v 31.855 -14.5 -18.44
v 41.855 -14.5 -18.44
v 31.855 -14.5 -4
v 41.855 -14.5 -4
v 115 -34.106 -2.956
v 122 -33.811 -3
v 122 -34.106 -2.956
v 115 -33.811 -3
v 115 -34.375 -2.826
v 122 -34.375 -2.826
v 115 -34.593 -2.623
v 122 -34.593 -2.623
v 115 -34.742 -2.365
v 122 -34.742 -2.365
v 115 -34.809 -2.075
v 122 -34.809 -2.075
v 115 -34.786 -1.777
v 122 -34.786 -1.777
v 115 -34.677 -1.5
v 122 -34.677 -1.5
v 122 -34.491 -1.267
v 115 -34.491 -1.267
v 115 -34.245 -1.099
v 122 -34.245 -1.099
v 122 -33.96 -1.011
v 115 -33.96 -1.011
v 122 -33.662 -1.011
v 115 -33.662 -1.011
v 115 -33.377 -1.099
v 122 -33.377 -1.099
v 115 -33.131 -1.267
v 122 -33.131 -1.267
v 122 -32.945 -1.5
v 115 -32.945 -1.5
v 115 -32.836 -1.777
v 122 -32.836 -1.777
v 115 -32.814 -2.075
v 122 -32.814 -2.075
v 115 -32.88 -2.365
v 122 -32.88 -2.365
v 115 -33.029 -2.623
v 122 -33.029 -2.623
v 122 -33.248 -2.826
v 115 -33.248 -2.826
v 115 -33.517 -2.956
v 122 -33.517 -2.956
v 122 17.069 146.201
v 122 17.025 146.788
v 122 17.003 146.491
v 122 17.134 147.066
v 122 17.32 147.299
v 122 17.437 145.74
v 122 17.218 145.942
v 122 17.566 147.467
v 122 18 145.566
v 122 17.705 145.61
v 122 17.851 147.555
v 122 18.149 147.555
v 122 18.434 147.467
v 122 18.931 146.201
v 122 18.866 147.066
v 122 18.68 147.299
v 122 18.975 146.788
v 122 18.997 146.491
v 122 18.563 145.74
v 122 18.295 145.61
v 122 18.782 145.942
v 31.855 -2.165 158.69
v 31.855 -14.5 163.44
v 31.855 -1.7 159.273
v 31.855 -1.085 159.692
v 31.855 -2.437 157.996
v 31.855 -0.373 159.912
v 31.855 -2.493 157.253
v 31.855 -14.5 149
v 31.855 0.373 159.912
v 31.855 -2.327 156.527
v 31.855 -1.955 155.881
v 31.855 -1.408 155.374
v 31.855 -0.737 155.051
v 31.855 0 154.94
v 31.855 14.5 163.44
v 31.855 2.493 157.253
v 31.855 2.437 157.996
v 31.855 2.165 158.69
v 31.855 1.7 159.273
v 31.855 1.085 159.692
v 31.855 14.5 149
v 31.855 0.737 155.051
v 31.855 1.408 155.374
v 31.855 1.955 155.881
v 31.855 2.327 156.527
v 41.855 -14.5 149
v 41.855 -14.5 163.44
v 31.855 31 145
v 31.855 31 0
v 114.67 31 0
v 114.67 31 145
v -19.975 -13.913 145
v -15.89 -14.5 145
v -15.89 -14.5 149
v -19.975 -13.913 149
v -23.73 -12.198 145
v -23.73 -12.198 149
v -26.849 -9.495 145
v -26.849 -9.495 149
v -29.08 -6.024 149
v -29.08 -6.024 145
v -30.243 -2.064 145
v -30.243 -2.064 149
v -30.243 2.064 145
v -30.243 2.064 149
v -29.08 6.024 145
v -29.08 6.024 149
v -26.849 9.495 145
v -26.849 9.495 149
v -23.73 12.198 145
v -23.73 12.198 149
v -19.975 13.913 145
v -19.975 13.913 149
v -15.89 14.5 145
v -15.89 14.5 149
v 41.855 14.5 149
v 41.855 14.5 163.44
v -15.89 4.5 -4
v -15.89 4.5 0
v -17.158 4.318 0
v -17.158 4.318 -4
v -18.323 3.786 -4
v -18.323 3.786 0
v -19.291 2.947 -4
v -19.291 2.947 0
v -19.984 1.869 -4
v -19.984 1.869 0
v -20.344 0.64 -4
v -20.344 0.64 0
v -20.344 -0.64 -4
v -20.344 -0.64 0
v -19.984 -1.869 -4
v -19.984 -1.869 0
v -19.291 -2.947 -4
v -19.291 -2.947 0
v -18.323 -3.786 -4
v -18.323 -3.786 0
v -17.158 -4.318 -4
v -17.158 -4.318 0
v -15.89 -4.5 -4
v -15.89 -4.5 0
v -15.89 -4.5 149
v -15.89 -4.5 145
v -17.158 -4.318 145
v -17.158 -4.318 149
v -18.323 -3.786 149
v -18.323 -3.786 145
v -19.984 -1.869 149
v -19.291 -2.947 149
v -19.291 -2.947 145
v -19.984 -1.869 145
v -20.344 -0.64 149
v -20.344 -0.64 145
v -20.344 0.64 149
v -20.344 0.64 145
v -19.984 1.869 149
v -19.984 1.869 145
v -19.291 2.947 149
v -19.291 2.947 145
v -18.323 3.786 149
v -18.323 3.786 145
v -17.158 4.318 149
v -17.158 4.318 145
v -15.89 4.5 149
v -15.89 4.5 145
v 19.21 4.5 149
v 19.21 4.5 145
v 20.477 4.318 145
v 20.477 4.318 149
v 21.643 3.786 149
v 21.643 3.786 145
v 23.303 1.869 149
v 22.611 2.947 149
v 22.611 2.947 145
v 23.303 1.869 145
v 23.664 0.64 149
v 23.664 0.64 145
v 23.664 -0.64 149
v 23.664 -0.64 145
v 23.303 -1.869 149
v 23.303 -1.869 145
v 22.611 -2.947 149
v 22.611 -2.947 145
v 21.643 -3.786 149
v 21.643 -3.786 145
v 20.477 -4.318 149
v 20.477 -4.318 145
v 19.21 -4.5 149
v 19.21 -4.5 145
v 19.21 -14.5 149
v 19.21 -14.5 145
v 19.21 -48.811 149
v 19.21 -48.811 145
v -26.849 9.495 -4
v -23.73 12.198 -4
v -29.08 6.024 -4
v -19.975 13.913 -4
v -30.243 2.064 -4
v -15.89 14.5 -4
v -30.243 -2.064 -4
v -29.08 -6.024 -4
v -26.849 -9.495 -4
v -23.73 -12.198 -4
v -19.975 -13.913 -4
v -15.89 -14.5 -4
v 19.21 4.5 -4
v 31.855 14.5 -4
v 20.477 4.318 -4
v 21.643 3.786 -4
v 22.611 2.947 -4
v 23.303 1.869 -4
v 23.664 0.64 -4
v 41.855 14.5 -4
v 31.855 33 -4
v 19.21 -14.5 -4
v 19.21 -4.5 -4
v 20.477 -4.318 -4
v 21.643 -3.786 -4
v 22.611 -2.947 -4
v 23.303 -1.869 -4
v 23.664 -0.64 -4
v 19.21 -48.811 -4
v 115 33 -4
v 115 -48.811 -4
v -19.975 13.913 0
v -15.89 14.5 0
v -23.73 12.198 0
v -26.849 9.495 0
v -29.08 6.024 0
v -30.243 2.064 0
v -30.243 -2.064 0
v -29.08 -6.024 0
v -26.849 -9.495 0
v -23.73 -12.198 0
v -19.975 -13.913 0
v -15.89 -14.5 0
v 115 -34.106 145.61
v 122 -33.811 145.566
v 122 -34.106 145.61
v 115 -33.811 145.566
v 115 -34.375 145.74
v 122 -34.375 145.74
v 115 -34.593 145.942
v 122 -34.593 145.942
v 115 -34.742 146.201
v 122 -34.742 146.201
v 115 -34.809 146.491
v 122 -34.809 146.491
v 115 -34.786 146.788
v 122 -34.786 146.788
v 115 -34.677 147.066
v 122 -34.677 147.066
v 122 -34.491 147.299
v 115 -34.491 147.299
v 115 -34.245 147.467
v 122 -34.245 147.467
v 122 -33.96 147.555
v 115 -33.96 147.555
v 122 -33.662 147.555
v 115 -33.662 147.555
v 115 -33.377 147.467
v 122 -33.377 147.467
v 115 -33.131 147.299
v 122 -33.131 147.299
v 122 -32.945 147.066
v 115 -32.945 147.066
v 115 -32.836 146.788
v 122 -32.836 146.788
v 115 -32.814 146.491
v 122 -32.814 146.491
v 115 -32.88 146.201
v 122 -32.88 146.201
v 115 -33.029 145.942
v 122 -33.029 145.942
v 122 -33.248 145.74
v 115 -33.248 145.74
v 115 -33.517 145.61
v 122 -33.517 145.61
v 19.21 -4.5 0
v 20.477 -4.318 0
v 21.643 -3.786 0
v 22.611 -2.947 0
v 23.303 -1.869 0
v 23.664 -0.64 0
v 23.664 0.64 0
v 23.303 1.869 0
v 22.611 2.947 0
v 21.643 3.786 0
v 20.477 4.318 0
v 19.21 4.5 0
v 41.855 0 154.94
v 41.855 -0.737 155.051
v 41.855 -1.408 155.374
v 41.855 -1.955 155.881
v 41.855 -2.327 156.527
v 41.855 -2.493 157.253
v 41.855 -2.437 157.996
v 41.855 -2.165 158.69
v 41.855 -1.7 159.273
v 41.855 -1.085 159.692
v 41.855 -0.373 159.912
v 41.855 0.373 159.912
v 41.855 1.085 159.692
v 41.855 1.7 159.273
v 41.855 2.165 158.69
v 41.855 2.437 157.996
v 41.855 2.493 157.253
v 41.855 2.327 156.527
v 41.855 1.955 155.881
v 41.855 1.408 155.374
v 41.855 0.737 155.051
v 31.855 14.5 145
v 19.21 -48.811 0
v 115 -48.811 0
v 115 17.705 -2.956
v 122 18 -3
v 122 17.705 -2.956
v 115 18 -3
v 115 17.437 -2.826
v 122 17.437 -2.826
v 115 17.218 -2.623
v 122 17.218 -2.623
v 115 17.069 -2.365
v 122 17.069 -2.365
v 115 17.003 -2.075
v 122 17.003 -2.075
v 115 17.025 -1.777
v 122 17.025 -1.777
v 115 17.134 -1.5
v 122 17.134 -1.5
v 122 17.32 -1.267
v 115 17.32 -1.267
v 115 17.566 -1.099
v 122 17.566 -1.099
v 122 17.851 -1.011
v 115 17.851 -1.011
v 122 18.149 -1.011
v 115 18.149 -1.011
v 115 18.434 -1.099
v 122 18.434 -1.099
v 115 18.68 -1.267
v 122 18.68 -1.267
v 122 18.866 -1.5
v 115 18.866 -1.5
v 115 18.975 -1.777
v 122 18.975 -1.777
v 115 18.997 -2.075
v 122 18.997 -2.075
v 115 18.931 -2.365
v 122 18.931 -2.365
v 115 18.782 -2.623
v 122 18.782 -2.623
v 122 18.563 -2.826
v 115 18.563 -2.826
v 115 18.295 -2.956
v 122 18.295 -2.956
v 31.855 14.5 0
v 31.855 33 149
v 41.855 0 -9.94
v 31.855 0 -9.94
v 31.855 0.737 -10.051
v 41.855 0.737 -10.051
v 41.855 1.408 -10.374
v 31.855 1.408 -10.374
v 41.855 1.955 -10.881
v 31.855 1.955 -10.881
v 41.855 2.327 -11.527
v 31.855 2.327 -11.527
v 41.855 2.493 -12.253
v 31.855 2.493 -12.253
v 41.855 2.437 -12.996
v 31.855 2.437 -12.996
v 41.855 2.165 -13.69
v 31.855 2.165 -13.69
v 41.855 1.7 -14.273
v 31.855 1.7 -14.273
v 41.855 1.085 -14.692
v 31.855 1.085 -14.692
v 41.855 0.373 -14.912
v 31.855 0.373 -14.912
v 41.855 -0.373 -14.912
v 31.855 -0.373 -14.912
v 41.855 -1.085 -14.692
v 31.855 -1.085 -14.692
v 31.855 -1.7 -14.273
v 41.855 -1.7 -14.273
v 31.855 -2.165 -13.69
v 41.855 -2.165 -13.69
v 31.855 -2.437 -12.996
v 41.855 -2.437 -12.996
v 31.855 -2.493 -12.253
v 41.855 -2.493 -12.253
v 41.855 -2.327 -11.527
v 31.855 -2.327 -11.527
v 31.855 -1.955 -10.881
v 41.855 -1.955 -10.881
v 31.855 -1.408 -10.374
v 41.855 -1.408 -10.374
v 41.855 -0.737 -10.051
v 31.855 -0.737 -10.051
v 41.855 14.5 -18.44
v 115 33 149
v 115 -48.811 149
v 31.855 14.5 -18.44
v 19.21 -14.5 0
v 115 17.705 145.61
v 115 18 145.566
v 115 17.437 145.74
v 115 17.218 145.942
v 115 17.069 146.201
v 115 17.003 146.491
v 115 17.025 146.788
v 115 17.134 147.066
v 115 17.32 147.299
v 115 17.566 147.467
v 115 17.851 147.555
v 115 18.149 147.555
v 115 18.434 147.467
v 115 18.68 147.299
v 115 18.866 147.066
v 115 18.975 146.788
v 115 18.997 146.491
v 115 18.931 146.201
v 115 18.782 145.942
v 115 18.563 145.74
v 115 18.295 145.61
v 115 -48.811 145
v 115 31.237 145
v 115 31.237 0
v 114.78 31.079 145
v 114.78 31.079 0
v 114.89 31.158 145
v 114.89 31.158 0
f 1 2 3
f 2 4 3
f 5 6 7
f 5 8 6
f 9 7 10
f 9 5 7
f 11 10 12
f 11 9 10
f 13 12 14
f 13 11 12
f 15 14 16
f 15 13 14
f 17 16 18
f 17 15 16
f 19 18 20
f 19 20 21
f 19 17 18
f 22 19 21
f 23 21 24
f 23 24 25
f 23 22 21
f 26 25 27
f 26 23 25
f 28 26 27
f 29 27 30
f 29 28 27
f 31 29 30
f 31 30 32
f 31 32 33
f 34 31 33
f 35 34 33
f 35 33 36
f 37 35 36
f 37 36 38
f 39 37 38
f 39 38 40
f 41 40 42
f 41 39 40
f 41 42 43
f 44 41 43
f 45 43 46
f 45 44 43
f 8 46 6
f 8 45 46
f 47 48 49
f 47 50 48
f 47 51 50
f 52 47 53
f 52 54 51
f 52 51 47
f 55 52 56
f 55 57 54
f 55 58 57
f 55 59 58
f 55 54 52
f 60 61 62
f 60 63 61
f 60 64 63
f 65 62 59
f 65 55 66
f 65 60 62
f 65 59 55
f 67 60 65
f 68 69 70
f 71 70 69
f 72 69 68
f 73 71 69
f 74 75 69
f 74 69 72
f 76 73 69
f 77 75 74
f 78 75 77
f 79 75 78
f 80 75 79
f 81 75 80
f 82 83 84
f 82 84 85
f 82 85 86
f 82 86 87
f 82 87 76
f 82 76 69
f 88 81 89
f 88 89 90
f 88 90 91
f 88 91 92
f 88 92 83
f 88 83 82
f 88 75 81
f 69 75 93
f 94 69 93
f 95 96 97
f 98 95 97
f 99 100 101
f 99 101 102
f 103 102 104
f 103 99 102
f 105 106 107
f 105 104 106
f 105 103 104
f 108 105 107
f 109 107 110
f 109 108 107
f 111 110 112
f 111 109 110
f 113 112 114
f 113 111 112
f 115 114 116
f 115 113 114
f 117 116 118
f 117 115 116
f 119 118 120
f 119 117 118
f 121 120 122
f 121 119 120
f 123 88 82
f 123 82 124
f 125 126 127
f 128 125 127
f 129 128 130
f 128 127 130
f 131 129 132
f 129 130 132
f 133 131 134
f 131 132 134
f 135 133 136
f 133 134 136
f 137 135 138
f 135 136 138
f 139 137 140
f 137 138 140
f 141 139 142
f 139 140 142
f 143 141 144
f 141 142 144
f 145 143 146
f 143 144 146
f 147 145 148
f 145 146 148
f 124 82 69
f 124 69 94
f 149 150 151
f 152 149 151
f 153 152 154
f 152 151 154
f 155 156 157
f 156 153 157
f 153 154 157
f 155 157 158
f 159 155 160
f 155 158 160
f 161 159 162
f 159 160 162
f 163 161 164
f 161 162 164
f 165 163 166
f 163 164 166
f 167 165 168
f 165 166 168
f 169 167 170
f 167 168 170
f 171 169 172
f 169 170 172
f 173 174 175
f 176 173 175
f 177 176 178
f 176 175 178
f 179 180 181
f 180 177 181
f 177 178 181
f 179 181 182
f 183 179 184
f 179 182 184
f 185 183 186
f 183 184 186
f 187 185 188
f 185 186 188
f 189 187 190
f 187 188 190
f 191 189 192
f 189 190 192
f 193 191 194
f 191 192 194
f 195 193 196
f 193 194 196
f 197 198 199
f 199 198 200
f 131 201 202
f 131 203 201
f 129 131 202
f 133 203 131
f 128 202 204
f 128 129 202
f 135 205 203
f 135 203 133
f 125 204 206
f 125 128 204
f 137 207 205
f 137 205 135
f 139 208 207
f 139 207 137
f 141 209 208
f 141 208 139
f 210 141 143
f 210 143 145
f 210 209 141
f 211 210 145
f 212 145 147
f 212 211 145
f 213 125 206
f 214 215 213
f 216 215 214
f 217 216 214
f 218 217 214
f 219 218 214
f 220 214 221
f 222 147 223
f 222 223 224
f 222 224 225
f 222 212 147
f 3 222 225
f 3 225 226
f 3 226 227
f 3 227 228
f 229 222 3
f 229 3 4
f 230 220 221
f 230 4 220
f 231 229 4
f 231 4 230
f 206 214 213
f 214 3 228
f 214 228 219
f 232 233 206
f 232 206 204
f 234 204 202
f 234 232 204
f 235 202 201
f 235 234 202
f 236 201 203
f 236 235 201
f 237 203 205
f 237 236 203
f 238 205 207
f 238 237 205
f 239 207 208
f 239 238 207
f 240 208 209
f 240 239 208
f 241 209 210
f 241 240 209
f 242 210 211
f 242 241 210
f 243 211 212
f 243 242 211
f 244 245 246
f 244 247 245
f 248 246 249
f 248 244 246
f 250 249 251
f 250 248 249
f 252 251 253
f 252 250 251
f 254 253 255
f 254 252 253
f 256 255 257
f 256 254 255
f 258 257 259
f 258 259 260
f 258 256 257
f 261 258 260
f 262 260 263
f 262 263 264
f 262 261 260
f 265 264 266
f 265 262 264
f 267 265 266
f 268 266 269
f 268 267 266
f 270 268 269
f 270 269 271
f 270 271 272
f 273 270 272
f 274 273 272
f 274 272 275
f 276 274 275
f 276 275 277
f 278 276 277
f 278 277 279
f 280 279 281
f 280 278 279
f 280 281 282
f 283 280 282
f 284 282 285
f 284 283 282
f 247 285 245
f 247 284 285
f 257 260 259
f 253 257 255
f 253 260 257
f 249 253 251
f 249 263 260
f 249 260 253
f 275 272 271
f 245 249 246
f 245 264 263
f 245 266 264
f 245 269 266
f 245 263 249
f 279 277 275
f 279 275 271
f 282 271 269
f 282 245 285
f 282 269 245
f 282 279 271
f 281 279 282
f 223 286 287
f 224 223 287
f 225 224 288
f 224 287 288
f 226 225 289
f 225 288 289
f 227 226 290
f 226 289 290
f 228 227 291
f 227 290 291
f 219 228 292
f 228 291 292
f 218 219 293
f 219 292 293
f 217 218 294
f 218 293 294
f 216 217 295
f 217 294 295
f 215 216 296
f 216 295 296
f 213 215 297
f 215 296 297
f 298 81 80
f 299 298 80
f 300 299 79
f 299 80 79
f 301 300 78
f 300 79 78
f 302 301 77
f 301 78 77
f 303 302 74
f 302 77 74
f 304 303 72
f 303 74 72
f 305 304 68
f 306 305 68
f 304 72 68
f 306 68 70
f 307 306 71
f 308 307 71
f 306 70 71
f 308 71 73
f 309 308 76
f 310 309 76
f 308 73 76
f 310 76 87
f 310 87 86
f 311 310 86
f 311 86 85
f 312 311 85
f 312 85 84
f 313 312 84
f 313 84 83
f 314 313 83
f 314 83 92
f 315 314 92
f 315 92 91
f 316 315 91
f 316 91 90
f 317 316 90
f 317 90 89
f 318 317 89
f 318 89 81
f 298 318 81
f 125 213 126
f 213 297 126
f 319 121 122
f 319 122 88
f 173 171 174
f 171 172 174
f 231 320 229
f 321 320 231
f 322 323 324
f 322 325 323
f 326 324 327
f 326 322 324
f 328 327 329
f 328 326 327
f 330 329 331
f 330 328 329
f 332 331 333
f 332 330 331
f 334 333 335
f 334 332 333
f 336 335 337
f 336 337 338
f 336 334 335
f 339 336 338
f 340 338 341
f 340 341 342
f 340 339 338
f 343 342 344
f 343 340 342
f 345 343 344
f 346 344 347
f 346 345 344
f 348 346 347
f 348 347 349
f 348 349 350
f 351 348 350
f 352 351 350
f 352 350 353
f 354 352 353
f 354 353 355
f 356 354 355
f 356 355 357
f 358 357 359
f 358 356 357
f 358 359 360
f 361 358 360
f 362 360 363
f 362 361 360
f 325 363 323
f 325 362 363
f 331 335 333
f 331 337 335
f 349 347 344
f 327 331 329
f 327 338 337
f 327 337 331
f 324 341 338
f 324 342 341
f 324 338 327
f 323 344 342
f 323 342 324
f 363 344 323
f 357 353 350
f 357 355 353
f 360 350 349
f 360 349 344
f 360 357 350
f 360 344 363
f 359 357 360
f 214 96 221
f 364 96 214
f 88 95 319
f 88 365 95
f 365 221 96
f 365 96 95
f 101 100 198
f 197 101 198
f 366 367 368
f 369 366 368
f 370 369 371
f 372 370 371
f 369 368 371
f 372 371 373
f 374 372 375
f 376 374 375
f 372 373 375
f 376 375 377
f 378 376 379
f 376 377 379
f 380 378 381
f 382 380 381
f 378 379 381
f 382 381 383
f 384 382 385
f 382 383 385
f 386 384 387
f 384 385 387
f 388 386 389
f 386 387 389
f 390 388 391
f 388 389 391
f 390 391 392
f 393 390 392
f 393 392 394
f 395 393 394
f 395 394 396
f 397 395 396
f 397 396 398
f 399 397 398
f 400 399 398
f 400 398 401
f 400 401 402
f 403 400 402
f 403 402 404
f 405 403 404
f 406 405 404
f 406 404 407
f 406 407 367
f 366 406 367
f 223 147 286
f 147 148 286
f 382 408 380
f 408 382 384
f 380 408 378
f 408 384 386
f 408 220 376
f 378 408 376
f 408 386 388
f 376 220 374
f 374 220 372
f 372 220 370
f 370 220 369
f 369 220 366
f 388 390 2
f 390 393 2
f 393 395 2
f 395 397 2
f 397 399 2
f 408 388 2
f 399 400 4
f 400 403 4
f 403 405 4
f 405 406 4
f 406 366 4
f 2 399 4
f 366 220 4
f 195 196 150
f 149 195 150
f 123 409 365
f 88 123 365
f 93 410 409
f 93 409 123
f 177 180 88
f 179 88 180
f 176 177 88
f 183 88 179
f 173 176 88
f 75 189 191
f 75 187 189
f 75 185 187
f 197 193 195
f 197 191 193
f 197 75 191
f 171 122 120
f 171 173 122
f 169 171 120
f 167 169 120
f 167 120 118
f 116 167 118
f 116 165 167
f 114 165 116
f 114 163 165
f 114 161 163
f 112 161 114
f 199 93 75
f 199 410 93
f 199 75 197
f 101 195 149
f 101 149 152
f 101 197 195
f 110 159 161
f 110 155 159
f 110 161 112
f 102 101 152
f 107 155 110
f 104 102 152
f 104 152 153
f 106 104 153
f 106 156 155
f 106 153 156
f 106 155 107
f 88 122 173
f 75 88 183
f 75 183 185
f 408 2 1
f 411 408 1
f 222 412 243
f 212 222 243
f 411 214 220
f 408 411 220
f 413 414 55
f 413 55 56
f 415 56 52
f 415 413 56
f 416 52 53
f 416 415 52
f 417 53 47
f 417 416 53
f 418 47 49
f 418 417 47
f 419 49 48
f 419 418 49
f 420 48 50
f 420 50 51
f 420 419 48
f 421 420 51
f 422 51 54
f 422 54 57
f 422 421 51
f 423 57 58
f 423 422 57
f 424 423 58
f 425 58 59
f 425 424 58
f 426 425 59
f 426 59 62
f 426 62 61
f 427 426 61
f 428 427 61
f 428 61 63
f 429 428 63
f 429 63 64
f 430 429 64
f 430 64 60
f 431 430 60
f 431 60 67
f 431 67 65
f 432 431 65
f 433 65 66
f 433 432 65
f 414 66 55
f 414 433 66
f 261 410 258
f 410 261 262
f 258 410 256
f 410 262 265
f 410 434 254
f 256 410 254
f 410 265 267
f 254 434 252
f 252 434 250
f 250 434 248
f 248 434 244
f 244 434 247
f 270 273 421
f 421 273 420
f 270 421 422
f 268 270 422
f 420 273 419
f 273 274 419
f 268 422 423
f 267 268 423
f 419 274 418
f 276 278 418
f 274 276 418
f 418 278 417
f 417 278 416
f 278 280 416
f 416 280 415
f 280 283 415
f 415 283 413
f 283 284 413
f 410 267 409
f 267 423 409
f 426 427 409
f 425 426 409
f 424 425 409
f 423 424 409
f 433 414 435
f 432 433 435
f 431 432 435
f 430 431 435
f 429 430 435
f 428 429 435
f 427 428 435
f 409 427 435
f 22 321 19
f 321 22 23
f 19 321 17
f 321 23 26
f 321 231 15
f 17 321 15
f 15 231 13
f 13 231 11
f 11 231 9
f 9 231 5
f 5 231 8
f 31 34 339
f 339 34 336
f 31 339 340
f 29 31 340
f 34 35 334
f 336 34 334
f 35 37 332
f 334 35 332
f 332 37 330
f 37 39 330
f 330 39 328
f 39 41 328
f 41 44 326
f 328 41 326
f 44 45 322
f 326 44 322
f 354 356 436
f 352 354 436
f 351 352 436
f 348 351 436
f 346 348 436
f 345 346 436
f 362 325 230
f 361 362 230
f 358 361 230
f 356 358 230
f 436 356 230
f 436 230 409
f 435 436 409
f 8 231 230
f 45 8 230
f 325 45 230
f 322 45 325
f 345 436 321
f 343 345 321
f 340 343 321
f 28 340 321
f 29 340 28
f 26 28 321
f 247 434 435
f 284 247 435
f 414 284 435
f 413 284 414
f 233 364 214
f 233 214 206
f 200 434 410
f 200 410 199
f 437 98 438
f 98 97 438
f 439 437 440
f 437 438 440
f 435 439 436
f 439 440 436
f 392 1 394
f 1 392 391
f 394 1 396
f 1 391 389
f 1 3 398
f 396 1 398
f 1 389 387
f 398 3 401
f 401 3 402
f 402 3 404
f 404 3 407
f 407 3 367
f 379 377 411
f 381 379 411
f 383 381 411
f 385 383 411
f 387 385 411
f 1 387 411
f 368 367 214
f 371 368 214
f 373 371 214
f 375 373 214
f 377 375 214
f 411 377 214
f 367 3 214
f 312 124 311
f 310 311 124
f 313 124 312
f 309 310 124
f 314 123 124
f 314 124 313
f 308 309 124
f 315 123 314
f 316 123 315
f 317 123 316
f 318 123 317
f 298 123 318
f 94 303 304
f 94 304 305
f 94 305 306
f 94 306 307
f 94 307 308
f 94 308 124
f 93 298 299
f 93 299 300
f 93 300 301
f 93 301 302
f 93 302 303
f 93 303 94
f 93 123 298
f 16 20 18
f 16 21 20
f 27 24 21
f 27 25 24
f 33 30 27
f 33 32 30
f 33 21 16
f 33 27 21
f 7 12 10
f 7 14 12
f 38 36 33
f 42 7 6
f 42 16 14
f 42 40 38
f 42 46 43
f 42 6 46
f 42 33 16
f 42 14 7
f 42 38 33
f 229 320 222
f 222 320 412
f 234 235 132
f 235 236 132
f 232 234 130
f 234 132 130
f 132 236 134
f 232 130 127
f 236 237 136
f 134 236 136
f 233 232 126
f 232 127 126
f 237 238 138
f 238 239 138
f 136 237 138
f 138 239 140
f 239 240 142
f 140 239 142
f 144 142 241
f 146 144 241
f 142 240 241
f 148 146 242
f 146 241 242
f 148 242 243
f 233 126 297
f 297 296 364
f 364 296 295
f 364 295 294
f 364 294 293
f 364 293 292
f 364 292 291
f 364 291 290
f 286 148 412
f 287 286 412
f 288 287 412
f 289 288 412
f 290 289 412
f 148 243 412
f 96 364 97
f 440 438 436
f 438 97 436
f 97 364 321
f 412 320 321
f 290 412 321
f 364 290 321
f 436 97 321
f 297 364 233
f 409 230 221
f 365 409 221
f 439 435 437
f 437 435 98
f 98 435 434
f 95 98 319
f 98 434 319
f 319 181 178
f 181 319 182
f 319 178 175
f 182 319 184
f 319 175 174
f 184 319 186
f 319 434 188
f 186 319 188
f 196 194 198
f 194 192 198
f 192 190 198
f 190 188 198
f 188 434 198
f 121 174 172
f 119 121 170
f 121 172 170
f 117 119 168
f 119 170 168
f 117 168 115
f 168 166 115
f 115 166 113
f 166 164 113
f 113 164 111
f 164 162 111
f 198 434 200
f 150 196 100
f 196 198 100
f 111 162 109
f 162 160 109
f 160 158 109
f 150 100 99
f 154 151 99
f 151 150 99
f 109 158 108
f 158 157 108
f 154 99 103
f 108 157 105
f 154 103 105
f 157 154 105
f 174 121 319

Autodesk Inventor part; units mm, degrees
sketch "Szkic1" plane through (0, 0, 0) normal (0, 0, 1) x (1, 0, 0)
  arc A0 (0, 35) -> (0, -35) centre (0, 0) ccw construction
  line L0 (0, 35) -> (390, 35) construction
  line L1 (0, -35) -> (390, -35) construction
  arc A1 (390, -35) -> (390, 35) centre (390, 0) ccw construction
  circle A2 centre (0, 0) radius 4.5
  circle A3 centre (390, 0) radius 4.5
  line L2 (130, 35) -> (130, 10) construction
  line L3 (260, 35) -> (260, 10) construction
  circle A4 centre (130, 10) radius 25 construction
  circle A5 centre (260, 10) radius 25 construction
  circle A6 centre (130, 10) radius 4.5
  circle A7 centre (260, 10) radius 4.5
  circle A8 centre (0, 0) radius 35 construction
  circle A9 centre (390, 0) radius 35 construction
  line L4 (117.8756, 33) -> (31.8551, 33)
  line L5 (375.6125, 33) -> (272.1244, 33)
  line L6 (247.8756, 33) -> (142.1244, 33)
  line L7 (31.8551, 31) -> (114.6703, 31)
  line L8 (145.3297, 31) -> (244.6703, 31)
  line L9 (275.3297, 31) -> (371.697, 31)
  arc A10 (375.6125, 33) -> (371.697, 31) centre (390, 0) ccw
  arc A11 (117.8756, 33) -> (114.6703, 31) centre (130, 10) ccw
  arc A12 (145.3297, 31) -> (142.1244, 33) centre (130, 10) ccw
  arc A13 (247.8756, 33) -> (244.6703, 31) centre (260, 10) ccw
  arc A14 (275.3297, 31) -> (272.1244, 33) centre (260, 10) ccw
  line L10 (31.8551, 14.5) -> (31.8551, 35) construction
  line L11 (31.8551, 33) -> (31.8551, 31)
  line L12 (260, 10) -> (260, 0)
  line L13 (130, 10) -> (130, 0)
  point P0 (423.5971, -9.8098)
  dimension "d94" = 50
  dimension "d0" = 70
  dimension "d1" = 390
  dimension "d2" = 390
  dimension "d3" = 70
  dimension "d4" = 9
  dimension "d5" = 9
  dimension "d10" = 25
  dimension "d11" = 25
  dimension "d12" = 9
  dimension "d13" = 9
  dimension "d14" = 130
  dimension "d15" = 260
  dimension "d24" = 2
  dimension "d25" = 2
  dimension "d26" = 2
  dimension "d27" = 1
  dimension "d95" = 2
extrude "Wyciągnięcie proste1" add sketch "Szkic1" along normal blind 145 contours A11 L7 L11 L4 | A10 L9 A14 L5 | A13 L8 A12 L6
ref_plane "Płaszczyzna konstrukcyjna1" through (117.8756, 33, 145) normal (0, 0, 1) x (-1, 0, 0)
sketch "Szkic3" plane through (117.8756, 33, 145) normal (0, 0, 1) x (-1, 0, 0)
  circle A0 centre (117.8756, 33) radius 4.5 projected
  arc A1 (133.7659, 28.5) -> (133.7659, 37.5) centre (133.7659, 33) ccw
  arc A2 (98.6659, 37.5) -> (98.6659, 28.5) centre (98.6659, 33) ccw
  line L0 (133.7659, 28.5) -> (98.6659, 28.5)
  line L1 (98.6659, 37.5) -> (133.7659, 37.5)
  line L2 (98.6659, 18.5) -> (133.7659, 18.5)
  arc A3 (133.7659, 18.5) -> (133.7659, 47.5) centre (133.7659, 33) ccw
  line L3 (133.7659, 47.5) -> (98.6659, 47.5)
  line L4 (86.0205, 18.5) -> (86.0205, -2) construction
  line L5 (98.6659, 18.5) -> (86.0205, 18.5)
  line L6 (98.6659, 47.5) -> (86.0205, 47.5)
  line L7 (86.0205, 0) -> (86.0205, 2) projected
  line L8 (86.0205, 18.5) -> (86.0205, 0)
  line L9 (98.6659, 47.5) -> (98.6659, 81.8113)
  line L10 (98.6659, 81.8113) -> (-234.1244, 81.8113)
  line L11 (-157.4541, 2) -> (-253.8214, 2) projected
  line L12 (86.0205, 0) -> (86.0205, 2)
  line L13 (-257.7369, 0) -> (-154.2487, 0) projected
  line L14 (86.0205, 0) -> (-238.0399, 0)
  circle A4 centre (-272.1244, 33) radius 35 construction
  line L15 (-234.1244, 2) -> (-234.1244, 18.5)
  line L16 (-234.1244, 2) -> (-238.0399, 0)
  line L17 (-246.7694, 47.5) -> (-246.7694, 81.8113)
  line L18 (-246.7694, 81.8113) -> (-234.1244, 81.8113)
  line L19 (-303.9795, 47.5) -> (-409.6259, 47.5) construction
  line L20 (-234.1244, 47.5) -> (-246.7694, 47.5)
  line L21 (-234.1244, 18.5) -> (-281.8694, 18.5)
  line L22 (-246.7694, 47.5) -> (-281.8694, 47.5)
  arc A5 (-281.8694, 47.5) -> (-281.8694, 18.5) centre (-281.8694, 33) ccw
  point P0 (-238.0399, 0)
  dimension "d33" = 9
  dimension "d34" = 9
  dimension "d35" = 10
  dimension "d36" = 47.7454
  dimension "d37" = 12.6455
  dimension "d38" = 12.6455
  dimension "d39" = 12.6455
  dimension "d40" = 0
  dimension "d64" = 47.745
  dimension "d93" = 16.5
extrude "Wyciągnięcie proste2" add sketch "Szkic3" along normal blind 4
ref_plane "Płaszczyzna konstrukcyjna4" through (117.8756, 33, 72.5) normal (0, 0, -1) x (-1, 0, 0)
mirror "Odbij2" about plane through (117.8756, 33, 72.5) normal (0, 0, -1) of "Wyciągnięcie proste2"
extrude "Wyciągnięcie proste4" cut sketch "Szkic1" along normal mid plane 10000 contours A6 | A7
sketch "Szkic8" plane through (0, 0, 145) normal (0, 0, 1) x (1, 0, 0)
  line L0 (352, 31) -> (371.697, 31) projected
  line L1 (352, 31) -> (355.9155, 33) projected
  line L2 (352, 31) -> (355.9155, 33)
  line L3 (375.6125, 33) -> (355.9155, 33) projected
  line L4 (355.9155, 33) -> (375.6125, 33)
  arc A0 (375.6125, 33) -> (371.697, 31) centre (390, 0) ccw projected
  line L5 (375.6125, 33) -> (371.697, 31)
  line L6 (352, 14.5) -> (352, 31) projected
  line L7 (371.697, 31) -> (352, 31)
  point P0 (0, 0)
  point P1 (352, -48.8113)
ref_plane "Płaszczyzna konstrukcyjna6" through (0, 0, 72.5) normal (0, 0, 1) x (1, 0, 0)
extrude "Wyciągnięcie proste5" cut sketch "Szkic8" along normal mid plane 1000 contours L1 L3 A0 L0
ref_plane "Płaszczyzna konstrukcyjna9" through (117.8756, 33, 149) normal (0, 0, 1) x (1, 0, 0)
sketch "Szkic12" plane through (117.8756, 33, 149) normal (0, 0, 1) x (1, 0, 0)
  line L0 (281.8694, -18.5) -> (234.1244, -18.5) projected
  arc A0 (281.8694, -47.5) -> (281.8694, -18.5) centre (281.8694, -33) ccw projected
  line L1 (246.7694, -47.5) -> (281.8694, -47.5) projected
  line L2 (246.7694, -81.8113) -> (246.7694, -47.5) projected
  line L3 (234.1244, -2) -> (234.1244, -81.8113) projected
  line L4 (-98.6659, -81.8113) -> (246.7694, -81.8113) projected
  point P0 (-117.8756, -33)
extrude "Wyciągnięcie proste7" cut sketch "Szkic12" against normal blind 17
extrude "Wyciągnięcie proste8" cut sketch "Szkic1" against normal blind 17 contours A3
ref_plane "Płaszczyzna konstrukcyjna10" through (117.8756, 33, 149) normal (0, 0, 1) x (1, 0, 0)
sketch "Szkic13" plane through (117.8756, 33, 149) normal (0, 0, 1) x (1, 0, 0)
  line L0 (234.1244, -81.8113) -> (234.1244, -2) projected
  line L1 (232.1244, -81.8113) -> (232.1244, -2)
  line L2 (234.1244, -2) -> (238.0399, 0) projected
  line L3 (238.0399, 0) -> (236.0399, 0)
  line L4 (238.0399, 0) -> (-86.0205, 0) projected
  line L5 (236.0399, 0) -> (232.1244, -2)
  line L6 (238.0399, 0) -> (234.1244, -2)
  line L7 (234.1244, -81.8113) -> (232.1244, -81.8113)
  line L8 (-98.6659, -81.8113) -> (246.7694, -81.8113) projected
  point P0 (-117.8756, -33)
  dimension "d70" = 2
  dimension "d71" = 2
extrude "Wyciągnięcie proste9" add sketch "Szkic13" along normal blind 17
ref_plane "Płaszczyzna konstrukcyjna11" through (117.8756, 33, 166) normal (0, 0, 1) x (1, 0, 0)
sketch "Szkic14" plane through (117.8756, 33, 166) normal (0, 0, 1) x (1, 0, 0)
  line L0 (232.1244, -81.8113) -> (234.1244, -81.8113) projected
  line L1 (-98.6659, -81.8113) -> (246.7694, -81.8113) projected
  line L2 (232.1244, -81.8113) -> (246.7694, -81.8113)
  line L3 (246.7694, -81.8113) -> (246.7694, -47.5) projected
  line L4 (246.7694, -81.8113) -> (246.7694, -47.5)
  line L5 (246.7694, -47.5) -> (281.8694, -47.5) projected
  line L6 (246.7694, -47.5) -> (281.8694, -47.5)
  line L7 (281.8694, -18.5) -> (234.1244, -18.5) projected
  line L8 (234.1244, -81.8113) -> (234.1244, -2) projected
  arc A0 (281.8694, -47.5) -> (281.8694, -18.5) centre (281.8694, -33) ccw projected
  circle A1 centre (272.1244, -33) radius 4.5 projected
  line L9 (232.1244, -2) -> (232.1244, -81.8113) projected
  line L10 (236.0399, 0) -> (232.1244, -2) projected
  line L11 (238.0399, 0) -> (236.0399, 0) projected
  line L12 (234.1244, -2) -> (238.0399, 0) projected
  point P0 (-117.8756, -33)
extrude "Wyciągnięcie proste10" add sketch "Szkic14" along normal blind 4
ref_plane "Płaszczyzna konstrukcyjna12" through (364.645, -48.8113, -4) normal (0, 0, -1) x (-1, 0, 0)
sketch "Szkic15" plane through (364.645, -48.8113, -4) normal (0, 0, -1) x (-1, 0, 0)
  line L0 (332.7899, 63.3113) -> (322.7899, 63.3113)
  line L1 (322.7899, 63.3113) -> (322.7899, 34.3113)
  line L2 (322.7899, 34.3113) -> (332.7899, 34.3113)
  line L3 (332.7899, 34.3113) -> (332.7899, 63.3113)
  point P0 (364.645, 48.8113)
  dimension "d78" = 10
extrude "Wyciągnięcie proste11" add sketch "Szkic15" along normal blind 14.44
ref_plane "Płaszczyzna konstrukcyjna13" through (117.8756, 33, 149) normal (0, 0, 1) x (1, 0, 0)
sketch "Szkic16" plane through (117.8756, 33, 149) normal (0, 0, 1) x (1, 0, 0)
  line L0 (-86.0205, -18.5) -> (-133.7659, -18.5) projected
  line L1 (-86.0205, -47.5) -> (-76.0205, -47.5) projected
  line L2 (-86.0205, -18.5) -> (-76.0205, -18.5)
  line L3 (-76.0205, -18.5) -> (-76.0205, -47.5)
  line L4 (-76.0205, -47.5) -> (-86.0205, -47.5)
  line L5 (-86.0205, -47.5) -> (-86.0205, -18.5)
  point P0 (-117.8756, -33)
  point P1 (-86.0205, -47.5)
  dimension "d82" = 10
extrude "Wyciągnięcie proste12" add sketch "Szkic16" along normal blind 14.44
ref_plane "Płaszczyzna konstrukcyjna14" through (31.8551, -14.5, -4) normal (-1, 0, 0) x (0, 0, 1)
sketch "Szkic17" plane through (31.8551, -14.5, -4) normal (-1, 0, 0) x (0, 0, 1)
  line L0 (4, 0) -> (4, 29) projected
  line L1 (4, 19) -> (-14.44, 19)
  line L2 (-14.44, 29) -> (-14.44, 0) projected
  line L3 (4, 10) -> (0, 10) projected
  line L4 (4, 10) -> (-12.44, 10)
  line L5 (4, 18.5) -> (-12.44, 18.5)
  line L6 (-12.44, 18.5) -> (-4.44, 18.5)
  line L7 (-4.44, 18.5) -> (-4.44, 10.5)
  line L8 (-4.44, 10.5) -> (-12.44, 10.5)
  line L9 (-12.44, 10.5) -> (-12.44, 18.5)
  circle A0 centre (-8.44, 14.5) radius 2.5
  point P0 (4, 14.5)
  dimension "d86" = 9
  dimension "d87" = 0.5
  dimension "d88" = 8
  dimension "d89" = 8
  dimension "d90" = 5
extrude "Wyciągnięcie proste13" cut sketch "Szkic17" against normal through all contours A0
mirror "Odbij3" about plane through (117.8756, 33, 72.5) normal (0, 0, -1) of "Wyciągnięcie proste13"
ref_plane "Płaszczyzna konstrukcyjna15" through (364.645, -48.8113, -4) normal (0, 0, -1) x (-1, 0, 0)
sketch "Szkic19" plane through (364.645, -48.8113, -4) normal (0, 0, -1) x (-1, 0, 0)
  circle A0 centre (234.645, 58.8113) radius 4.5 projected
  line L0 (234.645, 58.8113) -> (249.645, 58.8113)
  line L1 (249.645, 93.5676) -> (-84.3243, 93.5676)
  line L2 (-84.3243, 93.5676) -> (-84.3243, -14.4504)
  line L3 (-84.3243, -14.4504) -> (249.645, -14.4504)
  line L4 (249.645, -14.4504) -> (249.645, 93.5676)
  point P0 (364.645, 48.8113)
  dimension "d99" = 15
extrude "Wyciągnięcie proste14" cut sketch "Szkic19" against normal blind 682
ref_plane "Płaszczyzna konstrukcyjna16" through (115, -48.8113, -4) normal (1, 0, 0) x (0, 0, -1)
sketch "Szkic20" plane through (115, -48.8113, -4) normal (1, 0, 0) x (0, 0, -1)
  line L0 (0, 0) -> (-4, 0) projected
  line L1 (-2, 0) -> (-2, 15)
  line L2 (-153, 81.8113) -> (0, 81.8113) projected
  line L3 (-2, 81.8113) -> (-2, 66.8113)
  line L4 (-150.5659, 0) -> (-150.5659, 15)
  line L5 (-150.5659, 81.8113) -> (-150.5659, 66.8113)
  line L6 (-153, 81.8113) -> (-153, 63.3113) projected
  circle A0 centre (-150.5659, 66.8113) radius 1
  circle A1 centre (-150.5659, 15) radius 1
  circle A2 centre (-2, 15) radius 1
  circle A3 centre (-2, 66.8113) radius 1
  point P0 (-4, 48.8113)
  dimension "d103" = 15
  dimension "d104" = 15
  dimension "d105" = 2
  dimension "d106" = 2
  dimension "d107" = 2
  dimension "d108" = 2
extrude "Wyciągnięcie proste15" add sketch "Szkic20" along normal blind 7
ref_plane "Płaszczyzna konstrukcyjna5" through (117.8756, 33, 72.5) normal (0, 0, -1) x (-1, 0, 0)
properties part number "Podstawacz1"
